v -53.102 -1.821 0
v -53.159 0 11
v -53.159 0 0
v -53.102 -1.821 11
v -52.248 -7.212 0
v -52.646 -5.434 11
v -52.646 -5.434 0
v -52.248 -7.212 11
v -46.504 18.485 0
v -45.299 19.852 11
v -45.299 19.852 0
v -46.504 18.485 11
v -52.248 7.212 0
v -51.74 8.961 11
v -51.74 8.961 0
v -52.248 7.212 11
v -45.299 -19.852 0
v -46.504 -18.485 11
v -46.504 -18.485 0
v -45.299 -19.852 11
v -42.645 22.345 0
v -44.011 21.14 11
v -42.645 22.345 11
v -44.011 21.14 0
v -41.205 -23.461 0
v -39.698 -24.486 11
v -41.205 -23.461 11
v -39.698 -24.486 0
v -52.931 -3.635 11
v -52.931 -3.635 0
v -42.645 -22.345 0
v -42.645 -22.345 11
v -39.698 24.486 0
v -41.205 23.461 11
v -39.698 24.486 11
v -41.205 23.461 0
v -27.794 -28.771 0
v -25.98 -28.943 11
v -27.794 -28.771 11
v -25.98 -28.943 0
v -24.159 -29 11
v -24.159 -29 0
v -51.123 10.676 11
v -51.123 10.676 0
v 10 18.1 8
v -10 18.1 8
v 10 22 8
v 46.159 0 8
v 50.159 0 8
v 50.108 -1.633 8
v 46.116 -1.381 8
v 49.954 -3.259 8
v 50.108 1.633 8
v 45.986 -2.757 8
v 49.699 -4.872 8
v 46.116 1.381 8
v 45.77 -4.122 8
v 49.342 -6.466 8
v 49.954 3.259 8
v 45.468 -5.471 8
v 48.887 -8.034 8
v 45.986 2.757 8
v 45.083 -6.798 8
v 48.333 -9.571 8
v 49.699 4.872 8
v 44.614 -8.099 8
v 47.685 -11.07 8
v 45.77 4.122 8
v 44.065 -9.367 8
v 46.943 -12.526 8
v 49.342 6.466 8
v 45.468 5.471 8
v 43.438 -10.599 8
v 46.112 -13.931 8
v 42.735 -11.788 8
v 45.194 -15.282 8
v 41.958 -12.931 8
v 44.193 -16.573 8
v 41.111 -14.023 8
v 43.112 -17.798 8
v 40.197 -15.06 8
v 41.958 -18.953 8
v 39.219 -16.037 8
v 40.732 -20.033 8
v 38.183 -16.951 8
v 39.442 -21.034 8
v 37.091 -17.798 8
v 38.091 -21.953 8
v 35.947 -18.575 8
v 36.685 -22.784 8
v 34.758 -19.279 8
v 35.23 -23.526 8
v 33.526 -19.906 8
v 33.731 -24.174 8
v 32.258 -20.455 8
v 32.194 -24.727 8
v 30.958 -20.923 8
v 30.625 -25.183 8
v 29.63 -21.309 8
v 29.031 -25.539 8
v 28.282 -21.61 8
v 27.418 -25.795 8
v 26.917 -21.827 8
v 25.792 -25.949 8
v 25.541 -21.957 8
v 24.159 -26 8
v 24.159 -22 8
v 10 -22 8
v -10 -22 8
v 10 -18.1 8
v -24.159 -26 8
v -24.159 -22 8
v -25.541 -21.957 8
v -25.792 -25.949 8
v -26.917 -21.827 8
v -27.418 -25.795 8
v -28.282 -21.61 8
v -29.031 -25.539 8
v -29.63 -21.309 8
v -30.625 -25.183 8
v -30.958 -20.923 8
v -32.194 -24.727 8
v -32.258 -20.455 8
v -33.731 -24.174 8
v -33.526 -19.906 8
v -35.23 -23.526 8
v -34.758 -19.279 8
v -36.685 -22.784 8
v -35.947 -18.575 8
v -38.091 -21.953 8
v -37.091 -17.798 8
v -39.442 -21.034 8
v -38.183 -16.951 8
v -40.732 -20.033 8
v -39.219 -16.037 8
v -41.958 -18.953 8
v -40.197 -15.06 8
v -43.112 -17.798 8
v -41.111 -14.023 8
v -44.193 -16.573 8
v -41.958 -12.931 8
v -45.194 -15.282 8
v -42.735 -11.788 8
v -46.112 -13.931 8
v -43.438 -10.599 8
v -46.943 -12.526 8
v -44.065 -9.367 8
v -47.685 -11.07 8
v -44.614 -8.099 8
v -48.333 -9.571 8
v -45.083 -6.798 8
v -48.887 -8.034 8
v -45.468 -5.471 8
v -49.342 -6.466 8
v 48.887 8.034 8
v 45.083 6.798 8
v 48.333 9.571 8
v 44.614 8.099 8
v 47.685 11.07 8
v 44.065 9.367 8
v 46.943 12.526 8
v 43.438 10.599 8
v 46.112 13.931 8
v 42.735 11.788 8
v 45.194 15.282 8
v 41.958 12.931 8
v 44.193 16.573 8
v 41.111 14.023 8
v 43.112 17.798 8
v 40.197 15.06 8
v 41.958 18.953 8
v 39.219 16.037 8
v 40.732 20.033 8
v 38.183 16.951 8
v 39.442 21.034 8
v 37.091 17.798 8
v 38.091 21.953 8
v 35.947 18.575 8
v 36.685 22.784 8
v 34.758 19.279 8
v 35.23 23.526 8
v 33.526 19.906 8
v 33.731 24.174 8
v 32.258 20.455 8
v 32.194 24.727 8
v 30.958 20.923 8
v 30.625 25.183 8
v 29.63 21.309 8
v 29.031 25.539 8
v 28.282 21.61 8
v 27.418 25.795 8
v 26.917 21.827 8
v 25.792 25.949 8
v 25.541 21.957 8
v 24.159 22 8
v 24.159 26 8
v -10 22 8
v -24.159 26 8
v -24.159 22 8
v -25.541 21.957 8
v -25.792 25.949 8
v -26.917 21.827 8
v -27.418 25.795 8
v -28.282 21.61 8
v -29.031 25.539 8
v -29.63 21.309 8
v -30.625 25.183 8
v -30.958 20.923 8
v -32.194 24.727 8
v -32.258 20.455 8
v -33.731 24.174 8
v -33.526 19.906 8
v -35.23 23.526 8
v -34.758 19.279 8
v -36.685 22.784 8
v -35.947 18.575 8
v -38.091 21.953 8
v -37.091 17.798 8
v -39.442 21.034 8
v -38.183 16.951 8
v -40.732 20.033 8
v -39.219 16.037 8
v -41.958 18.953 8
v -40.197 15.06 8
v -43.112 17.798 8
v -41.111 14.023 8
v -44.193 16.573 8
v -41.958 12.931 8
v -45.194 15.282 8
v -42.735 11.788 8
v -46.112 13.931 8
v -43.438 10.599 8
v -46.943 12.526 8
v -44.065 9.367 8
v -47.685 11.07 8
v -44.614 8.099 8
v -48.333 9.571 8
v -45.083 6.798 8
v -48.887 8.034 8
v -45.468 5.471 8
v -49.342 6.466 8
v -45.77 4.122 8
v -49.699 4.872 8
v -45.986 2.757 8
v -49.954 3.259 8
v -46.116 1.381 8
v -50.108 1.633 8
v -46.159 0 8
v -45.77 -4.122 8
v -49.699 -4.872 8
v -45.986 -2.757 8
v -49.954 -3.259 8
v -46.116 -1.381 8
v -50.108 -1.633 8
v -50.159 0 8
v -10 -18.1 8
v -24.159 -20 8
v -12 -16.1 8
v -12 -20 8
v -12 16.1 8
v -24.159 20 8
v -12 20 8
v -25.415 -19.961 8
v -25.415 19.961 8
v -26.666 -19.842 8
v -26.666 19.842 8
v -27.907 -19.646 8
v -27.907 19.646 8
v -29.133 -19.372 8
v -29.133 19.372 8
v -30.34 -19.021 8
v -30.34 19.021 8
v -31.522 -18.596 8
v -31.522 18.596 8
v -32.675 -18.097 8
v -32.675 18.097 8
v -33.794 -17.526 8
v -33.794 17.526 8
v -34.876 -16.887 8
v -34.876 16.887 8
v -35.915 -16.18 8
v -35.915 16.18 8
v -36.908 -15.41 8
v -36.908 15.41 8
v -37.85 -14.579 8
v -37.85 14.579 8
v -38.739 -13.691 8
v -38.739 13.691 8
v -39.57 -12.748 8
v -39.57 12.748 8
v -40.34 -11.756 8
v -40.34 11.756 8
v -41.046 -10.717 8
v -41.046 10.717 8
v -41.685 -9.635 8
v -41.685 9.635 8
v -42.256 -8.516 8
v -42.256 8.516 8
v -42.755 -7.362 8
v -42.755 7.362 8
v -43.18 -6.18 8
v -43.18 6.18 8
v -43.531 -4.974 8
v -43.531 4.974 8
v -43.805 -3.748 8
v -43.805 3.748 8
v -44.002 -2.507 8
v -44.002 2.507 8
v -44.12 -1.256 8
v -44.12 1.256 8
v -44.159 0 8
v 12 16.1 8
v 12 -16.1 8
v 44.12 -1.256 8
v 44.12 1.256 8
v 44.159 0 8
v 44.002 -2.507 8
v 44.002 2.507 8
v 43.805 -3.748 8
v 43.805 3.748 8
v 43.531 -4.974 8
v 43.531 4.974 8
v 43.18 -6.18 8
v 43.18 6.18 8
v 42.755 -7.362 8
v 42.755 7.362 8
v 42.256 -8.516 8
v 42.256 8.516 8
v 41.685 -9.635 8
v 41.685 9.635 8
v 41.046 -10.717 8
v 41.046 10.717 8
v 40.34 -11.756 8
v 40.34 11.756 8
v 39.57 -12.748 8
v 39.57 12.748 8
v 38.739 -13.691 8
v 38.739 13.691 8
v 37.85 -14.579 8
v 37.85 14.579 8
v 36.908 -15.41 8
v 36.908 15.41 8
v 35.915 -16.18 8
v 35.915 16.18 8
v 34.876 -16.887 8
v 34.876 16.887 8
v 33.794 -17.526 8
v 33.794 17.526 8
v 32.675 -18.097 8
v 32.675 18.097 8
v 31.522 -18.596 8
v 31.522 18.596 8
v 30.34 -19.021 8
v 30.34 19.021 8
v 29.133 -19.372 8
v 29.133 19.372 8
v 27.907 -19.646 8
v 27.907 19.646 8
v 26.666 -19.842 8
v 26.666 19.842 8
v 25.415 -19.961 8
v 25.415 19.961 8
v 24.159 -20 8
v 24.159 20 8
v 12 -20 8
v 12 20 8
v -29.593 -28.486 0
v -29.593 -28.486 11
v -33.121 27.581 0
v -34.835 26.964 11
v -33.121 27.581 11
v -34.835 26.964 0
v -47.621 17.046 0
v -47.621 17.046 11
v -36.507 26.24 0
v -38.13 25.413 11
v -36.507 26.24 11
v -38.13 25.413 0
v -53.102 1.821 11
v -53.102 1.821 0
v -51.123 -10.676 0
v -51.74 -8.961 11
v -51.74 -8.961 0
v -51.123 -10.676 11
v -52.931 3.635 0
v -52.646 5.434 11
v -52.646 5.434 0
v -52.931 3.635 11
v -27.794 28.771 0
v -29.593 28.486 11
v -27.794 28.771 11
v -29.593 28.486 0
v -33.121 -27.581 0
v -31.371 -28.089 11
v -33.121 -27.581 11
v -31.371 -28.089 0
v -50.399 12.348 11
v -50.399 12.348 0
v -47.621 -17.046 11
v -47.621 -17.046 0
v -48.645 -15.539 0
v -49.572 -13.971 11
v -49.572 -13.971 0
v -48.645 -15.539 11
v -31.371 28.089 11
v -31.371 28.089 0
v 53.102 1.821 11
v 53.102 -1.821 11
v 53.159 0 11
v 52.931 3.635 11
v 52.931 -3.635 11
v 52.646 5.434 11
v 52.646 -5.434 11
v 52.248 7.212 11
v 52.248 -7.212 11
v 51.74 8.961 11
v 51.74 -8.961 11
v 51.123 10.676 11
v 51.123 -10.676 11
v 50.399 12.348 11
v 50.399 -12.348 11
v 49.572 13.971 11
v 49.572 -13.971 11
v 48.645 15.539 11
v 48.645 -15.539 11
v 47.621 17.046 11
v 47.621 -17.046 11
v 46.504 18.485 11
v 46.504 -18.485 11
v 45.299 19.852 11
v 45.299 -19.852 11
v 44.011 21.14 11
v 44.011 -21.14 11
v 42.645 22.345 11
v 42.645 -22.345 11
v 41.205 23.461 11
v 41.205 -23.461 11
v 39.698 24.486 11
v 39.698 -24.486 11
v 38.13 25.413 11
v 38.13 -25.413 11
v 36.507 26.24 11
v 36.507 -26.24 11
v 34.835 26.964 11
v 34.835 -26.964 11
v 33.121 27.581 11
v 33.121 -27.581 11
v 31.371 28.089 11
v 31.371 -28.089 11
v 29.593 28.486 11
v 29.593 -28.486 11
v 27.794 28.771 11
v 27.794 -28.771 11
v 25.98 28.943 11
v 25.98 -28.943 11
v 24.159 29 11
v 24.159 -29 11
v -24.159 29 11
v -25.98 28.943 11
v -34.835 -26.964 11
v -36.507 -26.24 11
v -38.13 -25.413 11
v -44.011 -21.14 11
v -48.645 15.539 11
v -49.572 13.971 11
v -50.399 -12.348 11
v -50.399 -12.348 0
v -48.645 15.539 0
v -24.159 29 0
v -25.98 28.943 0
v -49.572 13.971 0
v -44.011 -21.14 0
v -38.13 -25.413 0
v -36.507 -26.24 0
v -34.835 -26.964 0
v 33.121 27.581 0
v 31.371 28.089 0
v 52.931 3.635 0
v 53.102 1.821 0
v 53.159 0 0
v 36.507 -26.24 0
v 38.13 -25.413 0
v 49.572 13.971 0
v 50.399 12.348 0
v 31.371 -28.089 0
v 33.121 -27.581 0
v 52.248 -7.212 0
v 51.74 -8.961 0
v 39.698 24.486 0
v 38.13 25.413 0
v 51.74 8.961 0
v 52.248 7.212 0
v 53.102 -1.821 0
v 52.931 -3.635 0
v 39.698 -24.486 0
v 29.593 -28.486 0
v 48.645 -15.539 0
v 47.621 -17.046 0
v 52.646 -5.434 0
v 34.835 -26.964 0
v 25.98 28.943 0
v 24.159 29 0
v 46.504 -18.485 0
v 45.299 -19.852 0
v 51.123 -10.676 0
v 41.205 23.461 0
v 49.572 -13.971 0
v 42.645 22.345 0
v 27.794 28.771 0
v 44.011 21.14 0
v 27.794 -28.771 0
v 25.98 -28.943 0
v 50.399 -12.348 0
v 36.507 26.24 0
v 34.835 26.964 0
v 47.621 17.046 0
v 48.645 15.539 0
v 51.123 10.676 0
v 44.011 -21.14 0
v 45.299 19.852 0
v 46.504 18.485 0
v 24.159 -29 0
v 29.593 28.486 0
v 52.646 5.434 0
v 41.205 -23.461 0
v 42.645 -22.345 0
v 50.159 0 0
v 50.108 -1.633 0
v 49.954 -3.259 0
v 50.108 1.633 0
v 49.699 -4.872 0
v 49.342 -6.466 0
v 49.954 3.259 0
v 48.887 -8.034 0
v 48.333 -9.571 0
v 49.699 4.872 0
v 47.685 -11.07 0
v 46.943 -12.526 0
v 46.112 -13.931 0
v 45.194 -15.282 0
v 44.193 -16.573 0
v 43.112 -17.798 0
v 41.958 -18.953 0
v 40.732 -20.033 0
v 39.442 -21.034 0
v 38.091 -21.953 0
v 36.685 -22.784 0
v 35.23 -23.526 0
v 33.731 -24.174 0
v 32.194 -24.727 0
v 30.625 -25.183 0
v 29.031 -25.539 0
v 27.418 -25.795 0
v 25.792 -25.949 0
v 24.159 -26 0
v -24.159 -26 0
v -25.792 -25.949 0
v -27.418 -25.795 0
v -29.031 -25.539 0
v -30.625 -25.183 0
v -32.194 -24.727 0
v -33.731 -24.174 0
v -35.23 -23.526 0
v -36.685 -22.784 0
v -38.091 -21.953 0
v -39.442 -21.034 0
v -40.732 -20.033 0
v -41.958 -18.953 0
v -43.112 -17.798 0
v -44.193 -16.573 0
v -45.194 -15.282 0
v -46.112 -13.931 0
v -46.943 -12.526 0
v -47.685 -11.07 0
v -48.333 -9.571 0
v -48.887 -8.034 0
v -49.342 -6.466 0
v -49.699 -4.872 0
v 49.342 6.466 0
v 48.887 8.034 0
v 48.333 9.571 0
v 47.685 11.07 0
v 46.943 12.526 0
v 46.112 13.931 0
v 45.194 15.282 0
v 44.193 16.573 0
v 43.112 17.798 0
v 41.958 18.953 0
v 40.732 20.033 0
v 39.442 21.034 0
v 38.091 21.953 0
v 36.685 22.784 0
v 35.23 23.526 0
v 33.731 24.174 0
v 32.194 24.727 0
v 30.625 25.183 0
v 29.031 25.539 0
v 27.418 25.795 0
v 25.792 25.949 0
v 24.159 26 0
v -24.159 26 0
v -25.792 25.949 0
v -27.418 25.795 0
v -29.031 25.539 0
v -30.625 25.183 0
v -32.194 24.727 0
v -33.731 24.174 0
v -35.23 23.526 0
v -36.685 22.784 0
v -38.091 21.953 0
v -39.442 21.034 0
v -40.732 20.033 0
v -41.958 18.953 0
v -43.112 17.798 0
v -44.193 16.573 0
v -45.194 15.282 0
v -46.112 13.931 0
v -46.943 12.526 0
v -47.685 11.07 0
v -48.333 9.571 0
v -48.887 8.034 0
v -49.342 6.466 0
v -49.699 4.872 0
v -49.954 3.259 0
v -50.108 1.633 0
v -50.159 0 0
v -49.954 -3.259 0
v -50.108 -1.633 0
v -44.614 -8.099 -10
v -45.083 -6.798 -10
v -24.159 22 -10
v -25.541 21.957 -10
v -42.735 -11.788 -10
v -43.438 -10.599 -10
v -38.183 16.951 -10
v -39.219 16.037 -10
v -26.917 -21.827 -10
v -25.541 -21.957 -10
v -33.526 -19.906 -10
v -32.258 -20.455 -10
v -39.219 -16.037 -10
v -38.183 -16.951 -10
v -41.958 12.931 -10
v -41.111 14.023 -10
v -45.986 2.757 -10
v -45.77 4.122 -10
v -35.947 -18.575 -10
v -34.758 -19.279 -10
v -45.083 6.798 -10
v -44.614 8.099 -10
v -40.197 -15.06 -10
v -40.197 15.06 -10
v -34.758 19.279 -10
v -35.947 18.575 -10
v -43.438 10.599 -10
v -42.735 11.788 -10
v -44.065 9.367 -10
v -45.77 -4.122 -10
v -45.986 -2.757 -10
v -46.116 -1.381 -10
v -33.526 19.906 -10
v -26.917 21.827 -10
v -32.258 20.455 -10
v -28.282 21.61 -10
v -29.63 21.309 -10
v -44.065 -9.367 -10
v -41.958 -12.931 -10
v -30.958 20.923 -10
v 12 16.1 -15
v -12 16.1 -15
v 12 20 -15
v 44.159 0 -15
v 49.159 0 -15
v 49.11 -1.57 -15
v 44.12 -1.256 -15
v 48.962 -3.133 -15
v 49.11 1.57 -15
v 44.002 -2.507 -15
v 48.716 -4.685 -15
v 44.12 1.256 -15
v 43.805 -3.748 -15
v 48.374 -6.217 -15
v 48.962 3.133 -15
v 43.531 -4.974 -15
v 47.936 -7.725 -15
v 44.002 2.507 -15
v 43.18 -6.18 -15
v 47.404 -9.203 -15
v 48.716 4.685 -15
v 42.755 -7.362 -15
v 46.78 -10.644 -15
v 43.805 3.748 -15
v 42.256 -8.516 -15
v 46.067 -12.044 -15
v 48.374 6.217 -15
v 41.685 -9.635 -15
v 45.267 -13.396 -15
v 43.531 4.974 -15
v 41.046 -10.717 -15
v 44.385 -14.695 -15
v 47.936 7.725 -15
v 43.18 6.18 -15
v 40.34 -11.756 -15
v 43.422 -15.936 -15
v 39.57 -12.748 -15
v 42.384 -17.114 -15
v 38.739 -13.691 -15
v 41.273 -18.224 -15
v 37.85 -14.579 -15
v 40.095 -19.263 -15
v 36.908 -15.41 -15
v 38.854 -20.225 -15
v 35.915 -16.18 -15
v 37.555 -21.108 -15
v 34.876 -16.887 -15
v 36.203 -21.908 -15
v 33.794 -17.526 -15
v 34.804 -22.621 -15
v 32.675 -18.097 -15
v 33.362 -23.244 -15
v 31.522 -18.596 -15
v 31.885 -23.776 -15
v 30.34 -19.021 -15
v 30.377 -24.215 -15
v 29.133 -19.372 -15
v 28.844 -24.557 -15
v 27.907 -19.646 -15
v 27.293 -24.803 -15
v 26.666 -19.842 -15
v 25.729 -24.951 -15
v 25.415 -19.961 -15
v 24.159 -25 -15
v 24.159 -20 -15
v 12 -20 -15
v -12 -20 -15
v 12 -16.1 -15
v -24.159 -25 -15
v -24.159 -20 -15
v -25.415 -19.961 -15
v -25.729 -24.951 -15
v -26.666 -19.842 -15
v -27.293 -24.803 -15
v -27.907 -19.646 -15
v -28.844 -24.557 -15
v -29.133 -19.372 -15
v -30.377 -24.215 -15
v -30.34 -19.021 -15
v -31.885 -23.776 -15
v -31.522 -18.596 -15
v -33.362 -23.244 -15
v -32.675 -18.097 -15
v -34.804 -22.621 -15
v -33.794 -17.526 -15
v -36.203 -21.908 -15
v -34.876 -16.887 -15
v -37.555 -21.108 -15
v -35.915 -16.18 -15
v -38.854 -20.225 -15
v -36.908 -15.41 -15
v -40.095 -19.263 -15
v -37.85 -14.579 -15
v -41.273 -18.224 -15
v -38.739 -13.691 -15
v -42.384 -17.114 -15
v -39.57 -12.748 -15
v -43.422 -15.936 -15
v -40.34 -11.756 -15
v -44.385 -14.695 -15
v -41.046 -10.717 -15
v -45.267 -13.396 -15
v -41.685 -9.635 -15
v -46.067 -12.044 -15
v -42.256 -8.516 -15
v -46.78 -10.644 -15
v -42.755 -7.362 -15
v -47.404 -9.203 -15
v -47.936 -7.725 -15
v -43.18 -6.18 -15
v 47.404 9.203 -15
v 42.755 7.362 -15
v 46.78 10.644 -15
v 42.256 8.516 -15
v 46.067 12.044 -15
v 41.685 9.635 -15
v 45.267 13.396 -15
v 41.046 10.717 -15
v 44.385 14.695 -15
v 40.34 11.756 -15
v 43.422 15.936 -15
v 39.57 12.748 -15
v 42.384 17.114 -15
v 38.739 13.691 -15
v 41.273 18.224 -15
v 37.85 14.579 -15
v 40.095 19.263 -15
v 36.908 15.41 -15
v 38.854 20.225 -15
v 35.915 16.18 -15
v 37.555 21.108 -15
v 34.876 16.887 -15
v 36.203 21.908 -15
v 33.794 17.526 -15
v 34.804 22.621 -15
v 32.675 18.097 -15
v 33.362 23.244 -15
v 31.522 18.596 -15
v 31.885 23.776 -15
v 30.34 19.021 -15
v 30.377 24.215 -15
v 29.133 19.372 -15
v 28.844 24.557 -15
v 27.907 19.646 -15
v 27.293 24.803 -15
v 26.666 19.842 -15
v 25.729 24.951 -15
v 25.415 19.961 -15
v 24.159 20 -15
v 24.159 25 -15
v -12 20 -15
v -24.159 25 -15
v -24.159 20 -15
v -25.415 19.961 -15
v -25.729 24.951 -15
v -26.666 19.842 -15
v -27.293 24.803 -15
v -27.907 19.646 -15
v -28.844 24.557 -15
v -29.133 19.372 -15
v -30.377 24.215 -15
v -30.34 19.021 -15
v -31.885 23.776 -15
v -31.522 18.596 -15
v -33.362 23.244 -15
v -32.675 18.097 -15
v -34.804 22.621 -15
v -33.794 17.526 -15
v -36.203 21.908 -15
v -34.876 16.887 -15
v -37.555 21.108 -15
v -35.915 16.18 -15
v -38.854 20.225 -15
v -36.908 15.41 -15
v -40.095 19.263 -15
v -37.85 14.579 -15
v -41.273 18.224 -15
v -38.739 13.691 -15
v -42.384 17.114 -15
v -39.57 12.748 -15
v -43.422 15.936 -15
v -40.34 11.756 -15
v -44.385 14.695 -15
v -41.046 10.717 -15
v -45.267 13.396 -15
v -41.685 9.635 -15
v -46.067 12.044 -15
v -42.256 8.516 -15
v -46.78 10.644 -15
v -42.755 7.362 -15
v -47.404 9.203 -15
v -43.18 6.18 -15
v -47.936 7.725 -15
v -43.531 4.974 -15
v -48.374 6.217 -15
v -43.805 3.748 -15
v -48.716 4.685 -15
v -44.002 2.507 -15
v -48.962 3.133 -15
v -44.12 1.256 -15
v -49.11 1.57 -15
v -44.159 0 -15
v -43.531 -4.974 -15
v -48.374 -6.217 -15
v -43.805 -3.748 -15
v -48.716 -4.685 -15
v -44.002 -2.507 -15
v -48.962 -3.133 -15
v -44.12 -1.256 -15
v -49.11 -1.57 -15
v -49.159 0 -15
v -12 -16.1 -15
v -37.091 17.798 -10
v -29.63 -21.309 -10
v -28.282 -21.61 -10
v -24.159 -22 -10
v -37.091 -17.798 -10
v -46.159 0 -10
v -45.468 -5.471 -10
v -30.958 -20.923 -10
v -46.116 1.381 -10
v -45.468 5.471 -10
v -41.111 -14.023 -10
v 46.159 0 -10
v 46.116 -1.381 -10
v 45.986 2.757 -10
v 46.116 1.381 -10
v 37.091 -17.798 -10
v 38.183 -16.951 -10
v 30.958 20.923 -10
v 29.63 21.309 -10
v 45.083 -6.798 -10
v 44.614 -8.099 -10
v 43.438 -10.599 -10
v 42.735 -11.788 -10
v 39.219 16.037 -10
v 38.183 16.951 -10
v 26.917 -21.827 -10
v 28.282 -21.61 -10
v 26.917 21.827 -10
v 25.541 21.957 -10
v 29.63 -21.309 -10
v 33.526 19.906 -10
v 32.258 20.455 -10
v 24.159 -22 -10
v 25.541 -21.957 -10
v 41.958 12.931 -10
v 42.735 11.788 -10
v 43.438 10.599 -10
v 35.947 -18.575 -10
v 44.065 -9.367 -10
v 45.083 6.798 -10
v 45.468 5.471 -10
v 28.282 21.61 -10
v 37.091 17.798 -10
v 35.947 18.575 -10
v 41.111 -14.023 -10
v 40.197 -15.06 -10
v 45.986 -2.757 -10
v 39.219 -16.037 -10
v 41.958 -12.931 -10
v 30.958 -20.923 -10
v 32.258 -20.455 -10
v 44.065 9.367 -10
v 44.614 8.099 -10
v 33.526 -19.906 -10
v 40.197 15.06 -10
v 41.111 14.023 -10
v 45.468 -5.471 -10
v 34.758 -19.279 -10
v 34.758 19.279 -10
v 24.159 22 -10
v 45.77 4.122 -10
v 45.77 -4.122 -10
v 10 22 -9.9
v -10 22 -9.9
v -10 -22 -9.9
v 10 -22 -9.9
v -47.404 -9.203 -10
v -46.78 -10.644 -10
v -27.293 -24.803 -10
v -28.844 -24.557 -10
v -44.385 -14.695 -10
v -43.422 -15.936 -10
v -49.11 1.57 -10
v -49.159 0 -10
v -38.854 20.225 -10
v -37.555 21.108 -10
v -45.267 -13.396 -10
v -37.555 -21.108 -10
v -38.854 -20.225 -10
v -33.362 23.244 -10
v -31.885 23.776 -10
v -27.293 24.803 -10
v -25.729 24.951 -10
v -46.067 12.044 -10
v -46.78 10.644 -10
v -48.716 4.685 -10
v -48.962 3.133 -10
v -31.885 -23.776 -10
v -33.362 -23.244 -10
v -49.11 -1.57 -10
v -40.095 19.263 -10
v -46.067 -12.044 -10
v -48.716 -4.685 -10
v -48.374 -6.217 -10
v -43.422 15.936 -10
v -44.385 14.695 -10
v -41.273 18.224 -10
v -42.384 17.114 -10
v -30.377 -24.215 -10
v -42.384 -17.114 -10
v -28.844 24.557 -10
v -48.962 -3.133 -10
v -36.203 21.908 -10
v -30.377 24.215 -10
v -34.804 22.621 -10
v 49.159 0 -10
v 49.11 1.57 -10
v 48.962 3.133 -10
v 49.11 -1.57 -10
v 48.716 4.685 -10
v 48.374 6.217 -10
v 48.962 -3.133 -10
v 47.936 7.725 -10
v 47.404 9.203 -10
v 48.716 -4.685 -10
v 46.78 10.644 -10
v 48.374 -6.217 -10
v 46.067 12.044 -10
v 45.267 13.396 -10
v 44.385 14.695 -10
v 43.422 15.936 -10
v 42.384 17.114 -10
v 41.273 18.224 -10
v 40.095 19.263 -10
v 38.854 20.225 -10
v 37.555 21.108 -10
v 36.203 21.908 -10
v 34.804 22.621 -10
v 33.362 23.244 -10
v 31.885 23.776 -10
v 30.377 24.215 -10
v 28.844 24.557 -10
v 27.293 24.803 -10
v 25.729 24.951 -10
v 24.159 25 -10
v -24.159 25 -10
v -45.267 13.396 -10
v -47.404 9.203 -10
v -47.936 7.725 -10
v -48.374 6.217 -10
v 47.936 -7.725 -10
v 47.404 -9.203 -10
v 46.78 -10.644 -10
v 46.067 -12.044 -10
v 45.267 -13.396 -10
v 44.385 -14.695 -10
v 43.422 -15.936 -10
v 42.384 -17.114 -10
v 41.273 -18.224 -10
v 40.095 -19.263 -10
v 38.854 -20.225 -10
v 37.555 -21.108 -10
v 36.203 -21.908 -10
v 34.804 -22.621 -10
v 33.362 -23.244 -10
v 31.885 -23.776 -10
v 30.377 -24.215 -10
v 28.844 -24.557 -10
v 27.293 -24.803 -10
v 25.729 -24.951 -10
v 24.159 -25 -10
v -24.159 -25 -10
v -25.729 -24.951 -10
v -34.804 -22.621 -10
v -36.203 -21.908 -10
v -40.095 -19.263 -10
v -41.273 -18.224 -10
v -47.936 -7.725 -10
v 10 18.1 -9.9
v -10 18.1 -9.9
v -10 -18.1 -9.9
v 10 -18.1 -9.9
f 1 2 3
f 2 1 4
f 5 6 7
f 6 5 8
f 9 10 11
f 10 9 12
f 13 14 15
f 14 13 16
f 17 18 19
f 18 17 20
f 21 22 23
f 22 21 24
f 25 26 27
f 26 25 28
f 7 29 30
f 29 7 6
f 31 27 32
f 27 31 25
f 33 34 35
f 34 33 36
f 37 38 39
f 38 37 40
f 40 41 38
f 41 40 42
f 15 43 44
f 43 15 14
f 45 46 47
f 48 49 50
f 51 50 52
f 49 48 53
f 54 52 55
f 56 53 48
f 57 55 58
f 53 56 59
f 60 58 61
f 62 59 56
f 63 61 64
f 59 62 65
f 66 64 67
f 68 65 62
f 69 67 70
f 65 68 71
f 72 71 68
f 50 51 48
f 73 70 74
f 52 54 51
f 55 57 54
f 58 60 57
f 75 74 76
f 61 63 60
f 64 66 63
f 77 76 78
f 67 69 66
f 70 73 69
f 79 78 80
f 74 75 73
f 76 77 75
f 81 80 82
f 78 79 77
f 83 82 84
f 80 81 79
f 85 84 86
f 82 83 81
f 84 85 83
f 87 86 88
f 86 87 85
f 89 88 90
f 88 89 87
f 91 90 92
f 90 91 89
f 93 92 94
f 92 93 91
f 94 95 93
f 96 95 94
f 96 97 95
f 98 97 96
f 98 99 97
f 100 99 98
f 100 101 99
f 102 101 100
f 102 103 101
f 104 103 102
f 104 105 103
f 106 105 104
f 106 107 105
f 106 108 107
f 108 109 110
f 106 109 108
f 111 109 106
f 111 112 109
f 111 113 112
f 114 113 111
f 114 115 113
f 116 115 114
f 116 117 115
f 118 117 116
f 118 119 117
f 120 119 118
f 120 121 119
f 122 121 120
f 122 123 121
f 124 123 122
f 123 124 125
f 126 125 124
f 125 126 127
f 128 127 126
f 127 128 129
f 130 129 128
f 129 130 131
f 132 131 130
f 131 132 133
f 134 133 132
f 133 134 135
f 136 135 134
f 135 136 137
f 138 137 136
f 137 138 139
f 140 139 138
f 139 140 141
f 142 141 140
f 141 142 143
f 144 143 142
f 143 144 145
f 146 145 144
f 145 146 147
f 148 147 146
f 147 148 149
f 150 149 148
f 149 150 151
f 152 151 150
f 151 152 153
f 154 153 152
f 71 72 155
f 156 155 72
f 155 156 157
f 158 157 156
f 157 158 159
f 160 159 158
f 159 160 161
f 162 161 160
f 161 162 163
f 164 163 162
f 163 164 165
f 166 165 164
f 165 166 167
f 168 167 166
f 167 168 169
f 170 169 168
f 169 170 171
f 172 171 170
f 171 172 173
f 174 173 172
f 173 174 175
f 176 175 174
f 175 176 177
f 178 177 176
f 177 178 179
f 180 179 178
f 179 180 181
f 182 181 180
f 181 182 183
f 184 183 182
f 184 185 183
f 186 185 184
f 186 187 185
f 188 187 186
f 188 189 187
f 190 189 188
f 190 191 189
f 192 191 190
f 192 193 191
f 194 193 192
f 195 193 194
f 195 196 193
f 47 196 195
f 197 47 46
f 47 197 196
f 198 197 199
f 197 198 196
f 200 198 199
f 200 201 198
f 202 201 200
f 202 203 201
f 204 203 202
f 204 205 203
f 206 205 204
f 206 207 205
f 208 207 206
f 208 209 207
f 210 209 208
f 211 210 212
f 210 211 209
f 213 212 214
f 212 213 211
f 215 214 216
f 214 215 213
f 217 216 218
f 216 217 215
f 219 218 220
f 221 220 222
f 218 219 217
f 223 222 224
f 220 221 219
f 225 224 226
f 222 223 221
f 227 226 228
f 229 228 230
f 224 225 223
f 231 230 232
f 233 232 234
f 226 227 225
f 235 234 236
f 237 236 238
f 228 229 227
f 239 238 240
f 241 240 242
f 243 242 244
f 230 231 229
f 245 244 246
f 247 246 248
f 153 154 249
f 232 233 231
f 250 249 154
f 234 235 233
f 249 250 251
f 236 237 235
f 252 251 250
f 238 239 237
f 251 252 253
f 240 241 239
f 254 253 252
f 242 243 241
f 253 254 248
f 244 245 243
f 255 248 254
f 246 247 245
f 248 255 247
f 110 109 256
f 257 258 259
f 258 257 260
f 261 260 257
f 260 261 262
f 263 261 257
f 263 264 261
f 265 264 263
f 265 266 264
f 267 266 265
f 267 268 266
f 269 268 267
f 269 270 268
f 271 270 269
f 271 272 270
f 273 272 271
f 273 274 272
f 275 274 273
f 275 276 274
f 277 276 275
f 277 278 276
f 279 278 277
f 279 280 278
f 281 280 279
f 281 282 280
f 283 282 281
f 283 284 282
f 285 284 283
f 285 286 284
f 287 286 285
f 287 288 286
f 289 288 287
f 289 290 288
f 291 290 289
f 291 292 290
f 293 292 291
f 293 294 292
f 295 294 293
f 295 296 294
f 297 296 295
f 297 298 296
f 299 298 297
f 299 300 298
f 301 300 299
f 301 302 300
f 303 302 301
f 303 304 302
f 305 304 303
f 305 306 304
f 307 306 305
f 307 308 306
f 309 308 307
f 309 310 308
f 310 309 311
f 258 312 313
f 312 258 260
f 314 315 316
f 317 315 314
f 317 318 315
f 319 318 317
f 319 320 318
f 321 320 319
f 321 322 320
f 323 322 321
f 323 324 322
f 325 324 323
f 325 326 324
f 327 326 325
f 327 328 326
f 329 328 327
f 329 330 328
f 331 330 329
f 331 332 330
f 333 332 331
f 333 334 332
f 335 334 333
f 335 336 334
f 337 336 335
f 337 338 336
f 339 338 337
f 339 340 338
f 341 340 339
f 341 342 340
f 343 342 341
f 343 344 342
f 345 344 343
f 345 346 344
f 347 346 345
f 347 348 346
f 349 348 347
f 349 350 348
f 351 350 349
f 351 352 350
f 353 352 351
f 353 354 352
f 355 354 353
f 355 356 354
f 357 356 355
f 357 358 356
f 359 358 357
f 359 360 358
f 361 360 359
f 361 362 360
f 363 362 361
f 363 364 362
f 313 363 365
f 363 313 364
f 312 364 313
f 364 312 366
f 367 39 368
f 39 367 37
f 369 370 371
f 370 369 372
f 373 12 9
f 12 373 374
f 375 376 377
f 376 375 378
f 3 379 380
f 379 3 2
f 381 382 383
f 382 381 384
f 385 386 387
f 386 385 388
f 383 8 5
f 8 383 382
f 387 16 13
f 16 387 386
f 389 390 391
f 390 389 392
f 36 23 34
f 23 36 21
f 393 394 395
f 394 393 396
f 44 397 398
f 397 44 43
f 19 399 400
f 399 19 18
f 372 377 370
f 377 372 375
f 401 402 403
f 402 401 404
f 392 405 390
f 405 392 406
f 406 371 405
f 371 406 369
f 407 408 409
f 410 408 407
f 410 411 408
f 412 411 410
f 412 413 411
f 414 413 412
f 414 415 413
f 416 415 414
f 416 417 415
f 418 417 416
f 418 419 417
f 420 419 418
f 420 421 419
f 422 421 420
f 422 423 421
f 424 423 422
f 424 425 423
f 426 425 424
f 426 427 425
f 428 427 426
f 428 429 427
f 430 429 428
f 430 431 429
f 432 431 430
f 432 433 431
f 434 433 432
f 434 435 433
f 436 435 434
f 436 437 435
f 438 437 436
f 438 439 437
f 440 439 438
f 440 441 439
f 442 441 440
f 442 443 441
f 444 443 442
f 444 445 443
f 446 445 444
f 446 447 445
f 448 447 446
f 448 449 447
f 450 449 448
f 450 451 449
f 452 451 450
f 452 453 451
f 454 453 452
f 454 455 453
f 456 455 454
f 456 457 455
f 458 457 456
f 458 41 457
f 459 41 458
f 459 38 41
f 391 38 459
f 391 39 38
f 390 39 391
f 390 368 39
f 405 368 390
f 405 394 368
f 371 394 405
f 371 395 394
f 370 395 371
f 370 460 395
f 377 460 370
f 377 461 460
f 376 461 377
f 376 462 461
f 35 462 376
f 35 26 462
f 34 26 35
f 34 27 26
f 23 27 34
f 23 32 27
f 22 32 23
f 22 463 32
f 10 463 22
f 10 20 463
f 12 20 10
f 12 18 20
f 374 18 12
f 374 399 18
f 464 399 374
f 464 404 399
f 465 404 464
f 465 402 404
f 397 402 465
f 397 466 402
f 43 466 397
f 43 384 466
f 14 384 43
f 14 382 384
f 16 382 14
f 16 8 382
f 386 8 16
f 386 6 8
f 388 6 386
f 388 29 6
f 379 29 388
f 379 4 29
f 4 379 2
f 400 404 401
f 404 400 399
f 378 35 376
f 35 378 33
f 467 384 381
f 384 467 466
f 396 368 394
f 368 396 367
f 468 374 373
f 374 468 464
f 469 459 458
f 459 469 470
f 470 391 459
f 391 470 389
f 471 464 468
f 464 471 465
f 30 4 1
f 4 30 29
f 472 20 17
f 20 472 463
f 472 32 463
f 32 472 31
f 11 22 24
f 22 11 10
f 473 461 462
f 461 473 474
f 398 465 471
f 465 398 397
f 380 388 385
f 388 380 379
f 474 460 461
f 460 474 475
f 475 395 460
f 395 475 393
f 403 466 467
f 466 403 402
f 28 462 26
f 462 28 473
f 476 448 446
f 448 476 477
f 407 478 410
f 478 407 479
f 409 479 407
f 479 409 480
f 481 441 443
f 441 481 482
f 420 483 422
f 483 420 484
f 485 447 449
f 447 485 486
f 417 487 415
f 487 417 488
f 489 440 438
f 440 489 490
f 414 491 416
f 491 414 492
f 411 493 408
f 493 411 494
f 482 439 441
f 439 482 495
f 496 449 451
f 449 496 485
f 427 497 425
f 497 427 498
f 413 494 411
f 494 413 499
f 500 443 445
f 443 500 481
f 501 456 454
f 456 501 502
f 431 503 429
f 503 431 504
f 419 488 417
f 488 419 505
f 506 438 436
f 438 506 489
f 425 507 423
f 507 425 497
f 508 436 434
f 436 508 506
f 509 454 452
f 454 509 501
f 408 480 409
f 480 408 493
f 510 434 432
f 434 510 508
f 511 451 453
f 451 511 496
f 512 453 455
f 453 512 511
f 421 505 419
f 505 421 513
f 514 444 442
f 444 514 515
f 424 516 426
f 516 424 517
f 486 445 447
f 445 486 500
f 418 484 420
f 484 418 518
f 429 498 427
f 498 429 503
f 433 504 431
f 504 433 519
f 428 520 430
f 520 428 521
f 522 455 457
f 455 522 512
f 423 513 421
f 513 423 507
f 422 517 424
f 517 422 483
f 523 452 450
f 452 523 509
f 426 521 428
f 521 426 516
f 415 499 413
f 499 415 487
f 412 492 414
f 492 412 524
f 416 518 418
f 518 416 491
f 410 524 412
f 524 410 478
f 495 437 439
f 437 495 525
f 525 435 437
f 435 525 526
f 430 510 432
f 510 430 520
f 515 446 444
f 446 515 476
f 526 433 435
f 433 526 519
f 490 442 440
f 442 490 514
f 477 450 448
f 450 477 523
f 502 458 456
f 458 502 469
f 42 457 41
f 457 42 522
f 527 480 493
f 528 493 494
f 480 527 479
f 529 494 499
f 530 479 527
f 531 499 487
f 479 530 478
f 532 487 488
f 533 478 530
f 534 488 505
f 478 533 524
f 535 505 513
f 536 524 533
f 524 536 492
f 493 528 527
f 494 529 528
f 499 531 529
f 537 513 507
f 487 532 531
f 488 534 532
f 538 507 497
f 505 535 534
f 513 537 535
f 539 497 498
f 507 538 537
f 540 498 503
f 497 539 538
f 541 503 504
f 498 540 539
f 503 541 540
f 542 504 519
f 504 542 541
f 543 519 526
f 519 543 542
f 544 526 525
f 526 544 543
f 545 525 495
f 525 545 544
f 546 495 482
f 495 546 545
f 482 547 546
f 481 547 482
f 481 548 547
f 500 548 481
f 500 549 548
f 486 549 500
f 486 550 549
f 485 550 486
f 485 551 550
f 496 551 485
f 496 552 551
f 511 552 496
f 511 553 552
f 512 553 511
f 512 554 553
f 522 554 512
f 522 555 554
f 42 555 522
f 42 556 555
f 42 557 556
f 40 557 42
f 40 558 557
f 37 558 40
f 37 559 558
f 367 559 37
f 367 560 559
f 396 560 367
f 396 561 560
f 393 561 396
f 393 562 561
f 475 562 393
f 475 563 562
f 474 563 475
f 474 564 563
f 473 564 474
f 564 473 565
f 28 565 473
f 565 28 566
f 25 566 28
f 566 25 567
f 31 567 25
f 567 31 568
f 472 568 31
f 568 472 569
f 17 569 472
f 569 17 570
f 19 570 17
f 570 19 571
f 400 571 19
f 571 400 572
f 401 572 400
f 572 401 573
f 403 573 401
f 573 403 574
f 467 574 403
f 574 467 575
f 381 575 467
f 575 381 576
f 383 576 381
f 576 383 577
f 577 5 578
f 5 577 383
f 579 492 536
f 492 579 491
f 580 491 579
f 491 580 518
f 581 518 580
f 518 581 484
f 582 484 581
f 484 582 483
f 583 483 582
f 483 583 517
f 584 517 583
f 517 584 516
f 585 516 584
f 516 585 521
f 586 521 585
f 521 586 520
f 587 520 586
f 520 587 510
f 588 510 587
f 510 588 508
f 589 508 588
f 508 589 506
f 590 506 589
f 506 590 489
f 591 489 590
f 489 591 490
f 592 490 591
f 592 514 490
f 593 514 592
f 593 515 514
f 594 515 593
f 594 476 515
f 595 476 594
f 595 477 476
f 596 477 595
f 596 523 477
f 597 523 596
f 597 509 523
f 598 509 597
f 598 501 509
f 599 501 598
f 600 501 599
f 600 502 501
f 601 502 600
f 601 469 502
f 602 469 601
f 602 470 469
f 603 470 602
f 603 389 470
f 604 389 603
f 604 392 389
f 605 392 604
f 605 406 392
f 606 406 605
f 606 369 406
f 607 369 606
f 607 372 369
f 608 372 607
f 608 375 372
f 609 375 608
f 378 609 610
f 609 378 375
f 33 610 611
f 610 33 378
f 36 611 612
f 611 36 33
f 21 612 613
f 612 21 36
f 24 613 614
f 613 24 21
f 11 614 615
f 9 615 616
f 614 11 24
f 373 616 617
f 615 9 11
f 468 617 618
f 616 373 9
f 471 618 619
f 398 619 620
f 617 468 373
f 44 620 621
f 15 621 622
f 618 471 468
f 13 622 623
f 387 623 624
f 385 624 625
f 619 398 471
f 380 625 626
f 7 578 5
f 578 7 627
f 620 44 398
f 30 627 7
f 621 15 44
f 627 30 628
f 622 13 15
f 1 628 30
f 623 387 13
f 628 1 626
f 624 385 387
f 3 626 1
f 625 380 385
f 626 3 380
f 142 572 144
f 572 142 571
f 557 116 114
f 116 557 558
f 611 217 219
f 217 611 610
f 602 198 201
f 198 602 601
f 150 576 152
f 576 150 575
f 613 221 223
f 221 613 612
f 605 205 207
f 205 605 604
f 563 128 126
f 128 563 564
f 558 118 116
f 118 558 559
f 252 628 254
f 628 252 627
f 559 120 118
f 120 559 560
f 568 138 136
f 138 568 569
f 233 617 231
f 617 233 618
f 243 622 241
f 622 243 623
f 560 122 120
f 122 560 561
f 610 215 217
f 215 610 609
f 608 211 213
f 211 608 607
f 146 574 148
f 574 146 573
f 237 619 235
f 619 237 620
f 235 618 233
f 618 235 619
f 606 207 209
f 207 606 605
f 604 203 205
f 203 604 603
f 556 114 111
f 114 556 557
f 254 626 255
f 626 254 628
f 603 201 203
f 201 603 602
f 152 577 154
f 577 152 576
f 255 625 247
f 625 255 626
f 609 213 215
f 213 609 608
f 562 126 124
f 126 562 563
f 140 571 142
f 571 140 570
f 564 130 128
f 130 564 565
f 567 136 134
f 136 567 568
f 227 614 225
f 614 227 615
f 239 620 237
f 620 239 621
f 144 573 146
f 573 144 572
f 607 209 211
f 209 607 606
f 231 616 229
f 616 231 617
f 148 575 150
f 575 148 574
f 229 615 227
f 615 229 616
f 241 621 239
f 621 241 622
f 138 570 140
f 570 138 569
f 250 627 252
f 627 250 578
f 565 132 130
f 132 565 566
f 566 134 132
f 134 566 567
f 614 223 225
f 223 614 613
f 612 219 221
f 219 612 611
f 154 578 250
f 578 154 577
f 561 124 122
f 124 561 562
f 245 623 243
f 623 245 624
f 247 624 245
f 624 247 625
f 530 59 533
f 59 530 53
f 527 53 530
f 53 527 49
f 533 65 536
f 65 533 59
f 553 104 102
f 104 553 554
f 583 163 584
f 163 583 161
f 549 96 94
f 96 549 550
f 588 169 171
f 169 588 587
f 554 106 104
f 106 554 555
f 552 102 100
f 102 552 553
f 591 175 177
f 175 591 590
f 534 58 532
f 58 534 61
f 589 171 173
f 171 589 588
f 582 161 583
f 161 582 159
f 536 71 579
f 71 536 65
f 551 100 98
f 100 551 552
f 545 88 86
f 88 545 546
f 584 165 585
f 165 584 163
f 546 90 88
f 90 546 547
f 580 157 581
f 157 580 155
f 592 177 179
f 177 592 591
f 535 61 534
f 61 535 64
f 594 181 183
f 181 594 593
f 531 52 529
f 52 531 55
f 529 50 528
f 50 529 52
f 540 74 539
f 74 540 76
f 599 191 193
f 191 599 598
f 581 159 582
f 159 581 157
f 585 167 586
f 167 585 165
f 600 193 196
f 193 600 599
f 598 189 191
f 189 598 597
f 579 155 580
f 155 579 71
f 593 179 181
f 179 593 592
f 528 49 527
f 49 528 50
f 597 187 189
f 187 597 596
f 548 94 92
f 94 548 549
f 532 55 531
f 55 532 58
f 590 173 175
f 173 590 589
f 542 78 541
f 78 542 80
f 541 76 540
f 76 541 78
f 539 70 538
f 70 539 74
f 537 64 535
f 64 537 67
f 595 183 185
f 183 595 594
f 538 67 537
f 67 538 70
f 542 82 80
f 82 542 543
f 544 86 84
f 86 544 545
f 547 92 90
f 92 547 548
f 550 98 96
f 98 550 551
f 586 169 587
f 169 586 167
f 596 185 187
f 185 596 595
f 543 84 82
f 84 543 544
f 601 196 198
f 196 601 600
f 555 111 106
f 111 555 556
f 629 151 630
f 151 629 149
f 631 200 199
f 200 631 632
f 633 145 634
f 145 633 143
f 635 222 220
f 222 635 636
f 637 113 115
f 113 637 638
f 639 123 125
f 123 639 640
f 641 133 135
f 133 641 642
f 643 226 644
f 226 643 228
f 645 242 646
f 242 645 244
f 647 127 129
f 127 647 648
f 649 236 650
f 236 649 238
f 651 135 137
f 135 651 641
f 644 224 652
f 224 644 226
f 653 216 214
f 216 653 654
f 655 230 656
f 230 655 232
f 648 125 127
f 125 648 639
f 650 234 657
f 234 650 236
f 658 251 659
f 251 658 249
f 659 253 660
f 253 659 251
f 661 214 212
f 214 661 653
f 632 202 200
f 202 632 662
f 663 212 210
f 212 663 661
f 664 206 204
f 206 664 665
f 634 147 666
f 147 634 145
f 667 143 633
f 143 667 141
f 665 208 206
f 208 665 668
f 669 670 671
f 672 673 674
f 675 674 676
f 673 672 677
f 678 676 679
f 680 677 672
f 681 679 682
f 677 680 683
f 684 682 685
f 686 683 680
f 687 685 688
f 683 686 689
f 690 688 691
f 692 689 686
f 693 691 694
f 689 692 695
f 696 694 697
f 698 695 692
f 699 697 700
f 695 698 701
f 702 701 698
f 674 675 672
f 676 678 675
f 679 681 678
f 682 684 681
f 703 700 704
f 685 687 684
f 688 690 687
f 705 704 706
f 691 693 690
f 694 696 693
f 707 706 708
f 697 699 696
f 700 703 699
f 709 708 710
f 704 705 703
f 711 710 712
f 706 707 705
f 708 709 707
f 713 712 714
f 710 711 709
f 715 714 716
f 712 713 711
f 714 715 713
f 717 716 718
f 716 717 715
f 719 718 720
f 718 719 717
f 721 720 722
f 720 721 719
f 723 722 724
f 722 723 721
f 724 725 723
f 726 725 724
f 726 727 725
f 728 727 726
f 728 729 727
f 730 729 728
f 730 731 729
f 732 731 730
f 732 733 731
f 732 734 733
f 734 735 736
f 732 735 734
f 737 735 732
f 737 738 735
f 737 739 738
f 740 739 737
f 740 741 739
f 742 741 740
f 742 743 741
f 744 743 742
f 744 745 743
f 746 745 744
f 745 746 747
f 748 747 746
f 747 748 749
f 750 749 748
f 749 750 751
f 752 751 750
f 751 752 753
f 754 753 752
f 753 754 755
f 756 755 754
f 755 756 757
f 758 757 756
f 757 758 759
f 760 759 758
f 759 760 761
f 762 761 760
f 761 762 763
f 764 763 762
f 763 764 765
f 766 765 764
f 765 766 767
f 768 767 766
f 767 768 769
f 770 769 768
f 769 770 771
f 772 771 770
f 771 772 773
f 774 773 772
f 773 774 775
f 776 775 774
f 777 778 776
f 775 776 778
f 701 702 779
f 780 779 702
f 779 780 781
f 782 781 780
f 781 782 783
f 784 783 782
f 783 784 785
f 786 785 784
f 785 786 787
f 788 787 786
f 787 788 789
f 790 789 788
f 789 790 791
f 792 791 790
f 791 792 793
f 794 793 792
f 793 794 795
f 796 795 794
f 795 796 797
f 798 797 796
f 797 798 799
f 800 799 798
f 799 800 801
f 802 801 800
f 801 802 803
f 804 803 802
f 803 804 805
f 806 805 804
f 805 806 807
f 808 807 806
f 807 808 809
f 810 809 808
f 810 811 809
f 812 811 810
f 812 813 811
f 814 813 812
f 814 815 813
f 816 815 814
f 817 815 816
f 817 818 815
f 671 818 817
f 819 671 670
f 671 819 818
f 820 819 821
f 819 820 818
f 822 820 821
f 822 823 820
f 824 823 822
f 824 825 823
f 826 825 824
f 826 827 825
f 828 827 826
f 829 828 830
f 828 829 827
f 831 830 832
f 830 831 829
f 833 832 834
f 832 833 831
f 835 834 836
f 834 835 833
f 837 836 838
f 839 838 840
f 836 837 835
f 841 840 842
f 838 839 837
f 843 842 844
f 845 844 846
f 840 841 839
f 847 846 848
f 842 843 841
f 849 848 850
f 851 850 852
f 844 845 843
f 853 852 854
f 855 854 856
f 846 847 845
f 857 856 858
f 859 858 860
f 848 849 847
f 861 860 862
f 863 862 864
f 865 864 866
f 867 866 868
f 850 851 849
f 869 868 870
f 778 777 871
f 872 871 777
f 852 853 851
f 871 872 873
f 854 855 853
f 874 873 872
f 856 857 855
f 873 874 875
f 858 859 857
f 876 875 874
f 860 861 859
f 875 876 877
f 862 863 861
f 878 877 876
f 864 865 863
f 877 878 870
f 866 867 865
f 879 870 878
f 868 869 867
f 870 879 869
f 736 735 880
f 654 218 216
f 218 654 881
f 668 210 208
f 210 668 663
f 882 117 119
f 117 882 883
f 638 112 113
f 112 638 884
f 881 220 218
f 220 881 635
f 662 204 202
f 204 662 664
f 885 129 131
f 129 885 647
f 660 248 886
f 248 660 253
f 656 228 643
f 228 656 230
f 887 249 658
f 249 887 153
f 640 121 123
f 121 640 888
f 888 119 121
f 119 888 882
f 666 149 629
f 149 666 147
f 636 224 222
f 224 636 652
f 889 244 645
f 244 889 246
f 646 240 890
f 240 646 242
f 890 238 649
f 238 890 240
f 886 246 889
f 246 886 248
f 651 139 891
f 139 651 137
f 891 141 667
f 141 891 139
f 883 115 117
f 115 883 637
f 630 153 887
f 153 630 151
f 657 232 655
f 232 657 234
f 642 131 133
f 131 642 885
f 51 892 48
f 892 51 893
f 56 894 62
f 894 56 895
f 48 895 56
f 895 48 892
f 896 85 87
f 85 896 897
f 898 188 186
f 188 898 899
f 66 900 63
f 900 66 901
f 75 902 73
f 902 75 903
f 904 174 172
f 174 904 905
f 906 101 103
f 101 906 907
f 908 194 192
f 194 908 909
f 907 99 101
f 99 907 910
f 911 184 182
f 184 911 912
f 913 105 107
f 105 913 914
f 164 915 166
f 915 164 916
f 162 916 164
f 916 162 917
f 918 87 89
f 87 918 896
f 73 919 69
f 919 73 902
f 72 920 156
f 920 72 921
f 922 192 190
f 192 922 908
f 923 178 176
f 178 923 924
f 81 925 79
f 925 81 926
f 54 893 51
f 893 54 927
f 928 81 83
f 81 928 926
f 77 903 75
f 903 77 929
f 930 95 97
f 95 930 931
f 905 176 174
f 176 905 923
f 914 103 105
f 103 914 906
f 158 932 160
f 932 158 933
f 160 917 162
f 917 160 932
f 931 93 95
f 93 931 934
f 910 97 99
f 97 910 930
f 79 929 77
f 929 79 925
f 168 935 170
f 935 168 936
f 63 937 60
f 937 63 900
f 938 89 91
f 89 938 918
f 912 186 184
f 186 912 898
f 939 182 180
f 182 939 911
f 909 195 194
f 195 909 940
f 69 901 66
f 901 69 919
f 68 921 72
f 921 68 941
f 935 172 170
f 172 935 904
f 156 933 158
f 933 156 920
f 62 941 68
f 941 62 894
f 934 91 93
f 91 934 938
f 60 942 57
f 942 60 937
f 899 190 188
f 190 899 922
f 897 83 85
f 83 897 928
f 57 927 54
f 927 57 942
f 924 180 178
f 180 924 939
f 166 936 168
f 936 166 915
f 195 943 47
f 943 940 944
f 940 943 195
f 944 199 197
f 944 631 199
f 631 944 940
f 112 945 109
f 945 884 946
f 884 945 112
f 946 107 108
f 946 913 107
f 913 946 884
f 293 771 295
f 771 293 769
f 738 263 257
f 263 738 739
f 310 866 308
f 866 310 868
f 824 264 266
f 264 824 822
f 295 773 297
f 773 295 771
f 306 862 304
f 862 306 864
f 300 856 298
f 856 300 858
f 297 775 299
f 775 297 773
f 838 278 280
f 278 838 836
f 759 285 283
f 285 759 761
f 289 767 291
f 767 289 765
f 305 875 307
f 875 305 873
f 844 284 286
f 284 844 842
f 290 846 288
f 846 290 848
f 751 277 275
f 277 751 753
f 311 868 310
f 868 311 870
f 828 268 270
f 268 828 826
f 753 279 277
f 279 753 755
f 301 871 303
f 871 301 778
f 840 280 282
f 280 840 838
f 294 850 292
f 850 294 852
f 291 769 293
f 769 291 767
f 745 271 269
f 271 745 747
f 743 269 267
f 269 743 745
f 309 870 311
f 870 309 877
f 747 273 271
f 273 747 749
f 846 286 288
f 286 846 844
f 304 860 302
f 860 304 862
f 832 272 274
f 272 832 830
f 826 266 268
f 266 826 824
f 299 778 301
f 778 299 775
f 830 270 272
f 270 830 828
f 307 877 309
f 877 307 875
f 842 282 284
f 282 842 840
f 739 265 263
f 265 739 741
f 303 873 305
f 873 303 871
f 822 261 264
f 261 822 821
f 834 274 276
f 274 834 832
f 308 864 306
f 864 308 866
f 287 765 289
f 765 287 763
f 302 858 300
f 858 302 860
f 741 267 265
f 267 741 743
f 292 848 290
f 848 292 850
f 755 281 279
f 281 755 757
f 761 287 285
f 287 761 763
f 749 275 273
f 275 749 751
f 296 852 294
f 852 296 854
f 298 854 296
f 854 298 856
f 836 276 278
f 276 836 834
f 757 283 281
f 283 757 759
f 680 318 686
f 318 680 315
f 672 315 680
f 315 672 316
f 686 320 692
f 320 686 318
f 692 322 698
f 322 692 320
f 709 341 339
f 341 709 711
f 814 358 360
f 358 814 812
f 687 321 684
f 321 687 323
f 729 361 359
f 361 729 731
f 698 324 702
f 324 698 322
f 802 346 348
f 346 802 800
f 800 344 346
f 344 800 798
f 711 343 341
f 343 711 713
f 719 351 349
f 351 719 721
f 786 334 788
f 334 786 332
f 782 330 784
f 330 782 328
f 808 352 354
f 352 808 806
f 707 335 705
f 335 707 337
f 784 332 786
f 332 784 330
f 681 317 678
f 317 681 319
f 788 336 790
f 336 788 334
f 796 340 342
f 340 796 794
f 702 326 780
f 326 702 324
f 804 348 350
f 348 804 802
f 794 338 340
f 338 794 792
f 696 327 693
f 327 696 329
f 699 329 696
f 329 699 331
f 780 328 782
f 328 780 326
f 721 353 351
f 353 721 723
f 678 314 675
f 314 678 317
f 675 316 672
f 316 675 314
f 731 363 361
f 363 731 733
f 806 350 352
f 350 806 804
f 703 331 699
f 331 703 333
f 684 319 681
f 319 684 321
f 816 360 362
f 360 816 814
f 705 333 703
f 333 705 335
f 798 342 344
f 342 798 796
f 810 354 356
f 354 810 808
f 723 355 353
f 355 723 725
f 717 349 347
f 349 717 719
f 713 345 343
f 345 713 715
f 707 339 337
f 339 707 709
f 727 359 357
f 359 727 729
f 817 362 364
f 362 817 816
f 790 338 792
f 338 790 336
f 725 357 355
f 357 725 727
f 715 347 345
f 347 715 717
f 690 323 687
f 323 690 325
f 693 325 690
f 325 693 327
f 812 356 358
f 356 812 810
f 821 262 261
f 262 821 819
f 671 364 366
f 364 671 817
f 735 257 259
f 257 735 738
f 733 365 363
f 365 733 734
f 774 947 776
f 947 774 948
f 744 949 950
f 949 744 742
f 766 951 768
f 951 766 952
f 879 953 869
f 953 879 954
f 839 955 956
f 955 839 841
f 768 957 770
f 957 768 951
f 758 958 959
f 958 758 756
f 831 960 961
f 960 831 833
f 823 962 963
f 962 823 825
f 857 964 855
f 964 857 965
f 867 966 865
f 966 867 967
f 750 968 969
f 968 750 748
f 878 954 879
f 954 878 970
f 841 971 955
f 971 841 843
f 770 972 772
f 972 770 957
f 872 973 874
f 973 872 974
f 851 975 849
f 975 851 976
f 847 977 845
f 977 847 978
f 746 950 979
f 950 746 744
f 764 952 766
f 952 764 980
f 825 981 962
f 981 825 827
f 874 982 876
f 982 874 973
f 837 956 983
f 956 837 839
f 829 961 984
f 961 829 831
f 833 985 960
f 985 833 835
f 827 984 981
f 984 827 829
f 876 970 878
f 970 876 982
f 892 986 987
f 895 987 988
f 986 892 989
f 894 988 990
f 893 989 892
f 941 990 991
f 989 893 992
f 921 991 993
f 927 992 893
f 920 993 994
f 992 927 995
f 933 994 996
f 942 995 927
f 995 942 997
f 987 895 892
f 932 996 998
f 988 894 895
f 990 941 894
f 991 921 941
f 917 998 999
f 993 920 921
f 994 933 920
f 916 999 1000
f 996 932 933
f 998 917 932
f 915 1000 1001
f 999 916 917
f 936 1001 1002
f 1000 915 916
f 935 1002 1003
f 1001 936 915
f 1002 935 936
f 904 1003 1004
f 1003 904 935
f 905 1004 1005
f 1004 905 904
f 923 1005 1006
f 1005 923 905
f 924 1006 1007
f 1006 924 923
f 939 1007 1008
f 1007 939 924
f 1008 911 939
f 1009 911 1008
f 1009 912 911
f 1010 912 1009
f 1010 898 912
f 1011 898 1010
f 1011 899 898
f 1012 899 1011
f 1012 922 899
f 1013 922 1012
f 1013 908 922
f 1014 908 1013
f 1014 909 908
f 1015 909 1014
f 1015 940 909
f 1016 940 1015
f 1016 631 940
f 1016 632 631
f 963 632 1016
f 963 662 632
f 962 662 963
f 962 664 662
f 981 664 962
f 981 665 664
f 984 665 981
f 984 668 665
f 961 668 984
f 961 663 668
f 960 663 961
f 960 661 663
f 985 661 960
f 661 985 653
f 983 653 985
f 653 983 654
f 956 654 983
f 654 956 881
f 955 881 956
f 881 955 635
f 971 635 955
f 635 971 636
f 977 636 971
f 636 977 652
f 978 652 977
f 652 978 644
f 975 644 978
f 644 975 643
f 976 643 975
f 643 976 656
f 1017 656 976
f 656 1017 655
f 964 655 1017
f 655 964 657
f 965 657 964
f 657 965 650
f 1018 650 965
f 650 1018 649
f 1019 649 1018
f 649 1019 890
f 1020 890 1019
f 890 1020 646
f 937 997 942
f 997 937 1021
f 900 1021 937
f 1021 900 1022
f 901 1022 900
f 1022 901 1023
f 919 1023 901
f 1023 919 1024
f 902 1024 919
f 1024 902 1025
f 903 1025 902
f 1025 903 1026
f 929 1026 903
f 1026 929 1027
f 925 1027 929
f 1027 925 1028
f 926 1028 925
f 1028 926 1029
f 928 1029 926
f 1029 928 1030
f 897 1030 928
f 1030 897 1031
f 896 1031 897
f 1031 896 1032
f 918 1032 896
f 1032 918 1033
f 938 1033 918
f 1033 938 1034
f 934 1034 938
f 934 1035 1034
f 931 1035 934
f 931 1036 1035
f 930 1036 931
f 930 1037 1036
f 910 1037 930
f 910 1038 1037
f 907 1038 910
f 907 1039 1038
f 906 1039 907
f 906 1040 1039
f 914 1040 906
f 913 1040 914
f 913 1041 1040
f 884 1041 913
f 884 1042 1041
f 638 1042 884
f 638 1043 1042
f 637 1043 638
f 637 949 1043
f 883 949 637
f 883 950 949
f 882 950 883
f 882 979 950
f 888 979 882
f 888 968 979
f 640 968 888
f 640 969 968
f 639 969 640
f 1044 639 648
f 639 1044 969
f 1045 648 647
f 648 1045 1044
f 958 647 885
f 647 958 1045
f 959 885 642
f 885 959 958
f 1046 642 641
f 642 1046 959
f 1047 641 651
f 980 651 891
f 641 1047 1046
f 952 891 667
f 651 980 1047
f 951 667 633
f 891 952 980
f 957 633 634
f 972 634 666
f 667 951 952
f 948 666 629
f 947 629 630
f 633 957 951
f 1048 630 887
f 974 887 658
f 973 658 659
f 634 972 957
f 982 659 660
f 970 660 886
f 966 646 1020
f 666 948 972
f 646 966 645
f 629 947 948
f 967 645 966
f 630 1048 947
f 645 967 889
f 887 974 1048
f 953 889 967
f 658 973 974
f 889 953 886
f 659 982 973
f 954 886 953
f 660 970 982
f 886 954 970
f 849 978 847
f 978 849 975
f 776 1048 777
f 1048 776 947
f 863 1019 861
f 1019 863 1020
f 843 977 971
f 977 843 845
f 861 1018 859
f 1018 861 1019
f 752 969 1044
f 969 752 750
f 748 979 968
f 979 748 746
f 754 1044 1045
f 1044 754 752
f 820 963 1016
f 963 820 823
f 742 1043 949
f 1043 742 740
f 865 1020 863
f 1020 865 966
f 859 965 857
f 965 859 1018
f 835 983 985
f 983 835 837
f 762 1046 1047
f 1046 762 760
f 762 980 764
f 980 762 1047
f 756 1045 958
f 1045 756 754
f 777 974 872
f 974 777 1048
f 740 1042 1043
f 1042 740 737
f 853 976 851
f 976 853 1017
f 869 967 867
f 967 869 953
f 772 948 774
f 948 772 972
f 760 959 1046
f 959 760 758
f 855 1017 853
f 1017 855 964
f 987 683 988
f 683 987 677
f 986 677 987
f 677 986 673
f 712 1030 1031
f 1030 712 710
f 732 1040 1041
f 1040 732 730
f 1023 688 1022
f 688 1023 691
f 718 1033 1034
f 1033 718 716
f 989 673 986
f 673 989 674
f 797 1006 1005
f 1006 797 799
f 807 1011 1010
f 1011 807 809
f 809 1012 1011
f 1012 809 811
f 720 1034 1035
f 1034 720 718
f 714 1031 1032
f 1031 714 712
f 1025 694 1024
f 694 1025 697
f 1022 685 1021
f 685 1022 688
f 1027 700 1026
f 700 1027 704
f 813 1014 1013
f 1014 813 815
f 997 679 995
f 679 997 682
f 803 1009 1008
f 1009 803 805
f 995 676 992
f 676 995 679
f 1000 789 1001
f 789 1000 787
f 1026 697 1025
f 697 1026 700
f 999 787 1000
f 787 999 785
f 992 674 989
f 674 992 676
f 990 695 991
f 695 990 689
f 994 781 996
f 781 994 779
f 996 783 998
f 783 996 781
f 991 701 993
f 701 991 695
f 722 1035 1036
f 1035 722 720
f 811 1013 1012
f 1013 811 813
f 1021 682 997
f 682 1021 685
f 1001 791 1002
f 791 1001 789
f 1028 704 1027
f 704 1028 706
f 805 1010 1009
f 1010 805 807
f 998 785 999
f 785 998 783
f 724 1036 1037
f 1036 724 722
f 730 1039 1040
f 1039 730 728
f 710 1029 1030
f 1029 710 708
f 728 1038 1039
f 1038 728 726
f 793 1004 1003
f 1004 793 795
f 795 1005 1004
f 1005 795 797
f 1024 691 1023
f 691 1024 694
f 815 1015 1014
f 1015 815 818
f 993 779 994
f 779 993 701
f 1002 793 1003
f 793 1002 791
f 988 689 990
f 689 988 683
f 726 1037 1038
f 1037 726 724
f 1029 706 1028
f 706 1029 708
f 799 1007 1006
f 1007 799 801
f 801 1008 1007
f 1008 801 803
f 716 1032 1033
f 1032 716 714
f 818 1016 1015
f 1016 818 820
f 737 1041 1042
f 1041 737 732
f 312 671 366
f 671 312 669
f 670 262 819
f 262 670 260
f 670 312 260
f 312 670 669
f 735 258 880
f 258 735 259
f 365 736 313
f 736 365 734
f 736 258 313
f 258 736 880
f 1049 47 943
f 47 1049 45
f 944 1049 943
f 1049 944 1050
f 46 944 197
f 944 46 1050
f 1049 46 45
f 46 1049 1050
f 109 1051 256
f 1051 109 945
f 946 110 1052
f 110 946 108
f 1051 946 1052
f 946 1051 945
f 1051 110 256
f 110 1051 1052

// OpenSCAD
TOL = 0.1;

// Calculate how long the side length should be 
// for a rounded rectangle of a given perimeter
// with a known end radius...
function calcSideLength(perimeter, radius) = (perimeter - (6.2831853071 * radius)) / 2.0;

// Create a rounded rectangle at origin
module roundedRect(radius, length, thickness, accuracy = 100) {
	hlen = (length / 2.0);
	rad2 = (radius * 2.0);

	union() {
		// Create the two end cylinders at -hlen and hlen from origin
		translate([-hlen, 0, 0]) cylinder(h = (thickness), r = (radius), $fn = (accuracy));
		translate([ hlen, 0, 0]) cylinder(h = (thickness), r = (radius), $fn = (accuracy));
		
		// Create the cuboid which connects the cylinders
		translate([-hlen, -radius, 0]) cube([length, rad2, thickness]);
	}
}

// Create a rounded ring at origin
module roundedRing(radius, innerRadius, length, thickness, accuracy = 100) {
	difference() {
		roundedRect(radius, length, thickness, accuracy);
		translate([0,0,-TOL]) roundedRect(innerRadius, length, thickness + (TOL * 2.0), accuracy);
	}
}

module innerShaft(baseRadius, baseSide, height) {
	lipHeight = 5;
	slotWidth = 20;
	slotDepth = 2;
	slotWall = 2;
	
	difference() {
		union() {	
			roundedRing(baseRadius - 4, baseRadius - 6, baseSide, height);
			roundedRing(baseRadius - 1, baseRadius - 6, baseSide, lipHeight);

			// Horrible messy shit to make the walls for the slots
			translate([-((slotWidth / 2.0) + (slotWall)),((baseRadius - (6 - TOL)) - slotDepth) - slotWall, 0]) cube([slotWidth + (slotWall * 2.0), slotDepth + slotWall, height]);
			rotate([0,0,180]) translate([-((slotWidth / 2.0) + (slotWall)),((baseRadius - (6 - TOL)) - slotDepth) - slotWall, 0]) cube([slotWidth + (slotWall * 2.0), slotDepth + slotWall, height]);
		}

		// Horrible messy Shit to make the slots
		translate([-(slotWidth / 2.0),(baseRadius - (6 - TOL)) - slotDepth,lipHeight+TOL]) cube([slotWidth, slotDepth+10, (height - lipHeight) - slotWall]);
		rotate([0,0,180]) translate([-(slotWidth / 2.0),(baseRadius - (6 - TOL)) - slotDepth,lipHeight+TOL]) cube([slotWidth, slotDepth+10, (height - lipHeight) - slotWall]);
	}
	
}

module complete(perimeter) {
	// Base Radius and Side Length to base all other measures off of
	baseRadius = (perimeter / 10.0);
	baseSide   = calcSideLength(perimeter, baseRadius);

	// Base Thickness for Component Walls
	baseWall = 3.0;
	
	union() {
		translate([0,0,8]) roundedRect(baseRadius + baseWall, baseSide, 3);
		roundedRing(baseRadius + baseWall, baseRadius, baseSide, 10);
		translate([0,0,-15]) innerShaft(baseRadius, baseSide, 25);
	}
}

// Pass in the estimated perimeter 
// of the bag you wish to fit...
complete(260);
